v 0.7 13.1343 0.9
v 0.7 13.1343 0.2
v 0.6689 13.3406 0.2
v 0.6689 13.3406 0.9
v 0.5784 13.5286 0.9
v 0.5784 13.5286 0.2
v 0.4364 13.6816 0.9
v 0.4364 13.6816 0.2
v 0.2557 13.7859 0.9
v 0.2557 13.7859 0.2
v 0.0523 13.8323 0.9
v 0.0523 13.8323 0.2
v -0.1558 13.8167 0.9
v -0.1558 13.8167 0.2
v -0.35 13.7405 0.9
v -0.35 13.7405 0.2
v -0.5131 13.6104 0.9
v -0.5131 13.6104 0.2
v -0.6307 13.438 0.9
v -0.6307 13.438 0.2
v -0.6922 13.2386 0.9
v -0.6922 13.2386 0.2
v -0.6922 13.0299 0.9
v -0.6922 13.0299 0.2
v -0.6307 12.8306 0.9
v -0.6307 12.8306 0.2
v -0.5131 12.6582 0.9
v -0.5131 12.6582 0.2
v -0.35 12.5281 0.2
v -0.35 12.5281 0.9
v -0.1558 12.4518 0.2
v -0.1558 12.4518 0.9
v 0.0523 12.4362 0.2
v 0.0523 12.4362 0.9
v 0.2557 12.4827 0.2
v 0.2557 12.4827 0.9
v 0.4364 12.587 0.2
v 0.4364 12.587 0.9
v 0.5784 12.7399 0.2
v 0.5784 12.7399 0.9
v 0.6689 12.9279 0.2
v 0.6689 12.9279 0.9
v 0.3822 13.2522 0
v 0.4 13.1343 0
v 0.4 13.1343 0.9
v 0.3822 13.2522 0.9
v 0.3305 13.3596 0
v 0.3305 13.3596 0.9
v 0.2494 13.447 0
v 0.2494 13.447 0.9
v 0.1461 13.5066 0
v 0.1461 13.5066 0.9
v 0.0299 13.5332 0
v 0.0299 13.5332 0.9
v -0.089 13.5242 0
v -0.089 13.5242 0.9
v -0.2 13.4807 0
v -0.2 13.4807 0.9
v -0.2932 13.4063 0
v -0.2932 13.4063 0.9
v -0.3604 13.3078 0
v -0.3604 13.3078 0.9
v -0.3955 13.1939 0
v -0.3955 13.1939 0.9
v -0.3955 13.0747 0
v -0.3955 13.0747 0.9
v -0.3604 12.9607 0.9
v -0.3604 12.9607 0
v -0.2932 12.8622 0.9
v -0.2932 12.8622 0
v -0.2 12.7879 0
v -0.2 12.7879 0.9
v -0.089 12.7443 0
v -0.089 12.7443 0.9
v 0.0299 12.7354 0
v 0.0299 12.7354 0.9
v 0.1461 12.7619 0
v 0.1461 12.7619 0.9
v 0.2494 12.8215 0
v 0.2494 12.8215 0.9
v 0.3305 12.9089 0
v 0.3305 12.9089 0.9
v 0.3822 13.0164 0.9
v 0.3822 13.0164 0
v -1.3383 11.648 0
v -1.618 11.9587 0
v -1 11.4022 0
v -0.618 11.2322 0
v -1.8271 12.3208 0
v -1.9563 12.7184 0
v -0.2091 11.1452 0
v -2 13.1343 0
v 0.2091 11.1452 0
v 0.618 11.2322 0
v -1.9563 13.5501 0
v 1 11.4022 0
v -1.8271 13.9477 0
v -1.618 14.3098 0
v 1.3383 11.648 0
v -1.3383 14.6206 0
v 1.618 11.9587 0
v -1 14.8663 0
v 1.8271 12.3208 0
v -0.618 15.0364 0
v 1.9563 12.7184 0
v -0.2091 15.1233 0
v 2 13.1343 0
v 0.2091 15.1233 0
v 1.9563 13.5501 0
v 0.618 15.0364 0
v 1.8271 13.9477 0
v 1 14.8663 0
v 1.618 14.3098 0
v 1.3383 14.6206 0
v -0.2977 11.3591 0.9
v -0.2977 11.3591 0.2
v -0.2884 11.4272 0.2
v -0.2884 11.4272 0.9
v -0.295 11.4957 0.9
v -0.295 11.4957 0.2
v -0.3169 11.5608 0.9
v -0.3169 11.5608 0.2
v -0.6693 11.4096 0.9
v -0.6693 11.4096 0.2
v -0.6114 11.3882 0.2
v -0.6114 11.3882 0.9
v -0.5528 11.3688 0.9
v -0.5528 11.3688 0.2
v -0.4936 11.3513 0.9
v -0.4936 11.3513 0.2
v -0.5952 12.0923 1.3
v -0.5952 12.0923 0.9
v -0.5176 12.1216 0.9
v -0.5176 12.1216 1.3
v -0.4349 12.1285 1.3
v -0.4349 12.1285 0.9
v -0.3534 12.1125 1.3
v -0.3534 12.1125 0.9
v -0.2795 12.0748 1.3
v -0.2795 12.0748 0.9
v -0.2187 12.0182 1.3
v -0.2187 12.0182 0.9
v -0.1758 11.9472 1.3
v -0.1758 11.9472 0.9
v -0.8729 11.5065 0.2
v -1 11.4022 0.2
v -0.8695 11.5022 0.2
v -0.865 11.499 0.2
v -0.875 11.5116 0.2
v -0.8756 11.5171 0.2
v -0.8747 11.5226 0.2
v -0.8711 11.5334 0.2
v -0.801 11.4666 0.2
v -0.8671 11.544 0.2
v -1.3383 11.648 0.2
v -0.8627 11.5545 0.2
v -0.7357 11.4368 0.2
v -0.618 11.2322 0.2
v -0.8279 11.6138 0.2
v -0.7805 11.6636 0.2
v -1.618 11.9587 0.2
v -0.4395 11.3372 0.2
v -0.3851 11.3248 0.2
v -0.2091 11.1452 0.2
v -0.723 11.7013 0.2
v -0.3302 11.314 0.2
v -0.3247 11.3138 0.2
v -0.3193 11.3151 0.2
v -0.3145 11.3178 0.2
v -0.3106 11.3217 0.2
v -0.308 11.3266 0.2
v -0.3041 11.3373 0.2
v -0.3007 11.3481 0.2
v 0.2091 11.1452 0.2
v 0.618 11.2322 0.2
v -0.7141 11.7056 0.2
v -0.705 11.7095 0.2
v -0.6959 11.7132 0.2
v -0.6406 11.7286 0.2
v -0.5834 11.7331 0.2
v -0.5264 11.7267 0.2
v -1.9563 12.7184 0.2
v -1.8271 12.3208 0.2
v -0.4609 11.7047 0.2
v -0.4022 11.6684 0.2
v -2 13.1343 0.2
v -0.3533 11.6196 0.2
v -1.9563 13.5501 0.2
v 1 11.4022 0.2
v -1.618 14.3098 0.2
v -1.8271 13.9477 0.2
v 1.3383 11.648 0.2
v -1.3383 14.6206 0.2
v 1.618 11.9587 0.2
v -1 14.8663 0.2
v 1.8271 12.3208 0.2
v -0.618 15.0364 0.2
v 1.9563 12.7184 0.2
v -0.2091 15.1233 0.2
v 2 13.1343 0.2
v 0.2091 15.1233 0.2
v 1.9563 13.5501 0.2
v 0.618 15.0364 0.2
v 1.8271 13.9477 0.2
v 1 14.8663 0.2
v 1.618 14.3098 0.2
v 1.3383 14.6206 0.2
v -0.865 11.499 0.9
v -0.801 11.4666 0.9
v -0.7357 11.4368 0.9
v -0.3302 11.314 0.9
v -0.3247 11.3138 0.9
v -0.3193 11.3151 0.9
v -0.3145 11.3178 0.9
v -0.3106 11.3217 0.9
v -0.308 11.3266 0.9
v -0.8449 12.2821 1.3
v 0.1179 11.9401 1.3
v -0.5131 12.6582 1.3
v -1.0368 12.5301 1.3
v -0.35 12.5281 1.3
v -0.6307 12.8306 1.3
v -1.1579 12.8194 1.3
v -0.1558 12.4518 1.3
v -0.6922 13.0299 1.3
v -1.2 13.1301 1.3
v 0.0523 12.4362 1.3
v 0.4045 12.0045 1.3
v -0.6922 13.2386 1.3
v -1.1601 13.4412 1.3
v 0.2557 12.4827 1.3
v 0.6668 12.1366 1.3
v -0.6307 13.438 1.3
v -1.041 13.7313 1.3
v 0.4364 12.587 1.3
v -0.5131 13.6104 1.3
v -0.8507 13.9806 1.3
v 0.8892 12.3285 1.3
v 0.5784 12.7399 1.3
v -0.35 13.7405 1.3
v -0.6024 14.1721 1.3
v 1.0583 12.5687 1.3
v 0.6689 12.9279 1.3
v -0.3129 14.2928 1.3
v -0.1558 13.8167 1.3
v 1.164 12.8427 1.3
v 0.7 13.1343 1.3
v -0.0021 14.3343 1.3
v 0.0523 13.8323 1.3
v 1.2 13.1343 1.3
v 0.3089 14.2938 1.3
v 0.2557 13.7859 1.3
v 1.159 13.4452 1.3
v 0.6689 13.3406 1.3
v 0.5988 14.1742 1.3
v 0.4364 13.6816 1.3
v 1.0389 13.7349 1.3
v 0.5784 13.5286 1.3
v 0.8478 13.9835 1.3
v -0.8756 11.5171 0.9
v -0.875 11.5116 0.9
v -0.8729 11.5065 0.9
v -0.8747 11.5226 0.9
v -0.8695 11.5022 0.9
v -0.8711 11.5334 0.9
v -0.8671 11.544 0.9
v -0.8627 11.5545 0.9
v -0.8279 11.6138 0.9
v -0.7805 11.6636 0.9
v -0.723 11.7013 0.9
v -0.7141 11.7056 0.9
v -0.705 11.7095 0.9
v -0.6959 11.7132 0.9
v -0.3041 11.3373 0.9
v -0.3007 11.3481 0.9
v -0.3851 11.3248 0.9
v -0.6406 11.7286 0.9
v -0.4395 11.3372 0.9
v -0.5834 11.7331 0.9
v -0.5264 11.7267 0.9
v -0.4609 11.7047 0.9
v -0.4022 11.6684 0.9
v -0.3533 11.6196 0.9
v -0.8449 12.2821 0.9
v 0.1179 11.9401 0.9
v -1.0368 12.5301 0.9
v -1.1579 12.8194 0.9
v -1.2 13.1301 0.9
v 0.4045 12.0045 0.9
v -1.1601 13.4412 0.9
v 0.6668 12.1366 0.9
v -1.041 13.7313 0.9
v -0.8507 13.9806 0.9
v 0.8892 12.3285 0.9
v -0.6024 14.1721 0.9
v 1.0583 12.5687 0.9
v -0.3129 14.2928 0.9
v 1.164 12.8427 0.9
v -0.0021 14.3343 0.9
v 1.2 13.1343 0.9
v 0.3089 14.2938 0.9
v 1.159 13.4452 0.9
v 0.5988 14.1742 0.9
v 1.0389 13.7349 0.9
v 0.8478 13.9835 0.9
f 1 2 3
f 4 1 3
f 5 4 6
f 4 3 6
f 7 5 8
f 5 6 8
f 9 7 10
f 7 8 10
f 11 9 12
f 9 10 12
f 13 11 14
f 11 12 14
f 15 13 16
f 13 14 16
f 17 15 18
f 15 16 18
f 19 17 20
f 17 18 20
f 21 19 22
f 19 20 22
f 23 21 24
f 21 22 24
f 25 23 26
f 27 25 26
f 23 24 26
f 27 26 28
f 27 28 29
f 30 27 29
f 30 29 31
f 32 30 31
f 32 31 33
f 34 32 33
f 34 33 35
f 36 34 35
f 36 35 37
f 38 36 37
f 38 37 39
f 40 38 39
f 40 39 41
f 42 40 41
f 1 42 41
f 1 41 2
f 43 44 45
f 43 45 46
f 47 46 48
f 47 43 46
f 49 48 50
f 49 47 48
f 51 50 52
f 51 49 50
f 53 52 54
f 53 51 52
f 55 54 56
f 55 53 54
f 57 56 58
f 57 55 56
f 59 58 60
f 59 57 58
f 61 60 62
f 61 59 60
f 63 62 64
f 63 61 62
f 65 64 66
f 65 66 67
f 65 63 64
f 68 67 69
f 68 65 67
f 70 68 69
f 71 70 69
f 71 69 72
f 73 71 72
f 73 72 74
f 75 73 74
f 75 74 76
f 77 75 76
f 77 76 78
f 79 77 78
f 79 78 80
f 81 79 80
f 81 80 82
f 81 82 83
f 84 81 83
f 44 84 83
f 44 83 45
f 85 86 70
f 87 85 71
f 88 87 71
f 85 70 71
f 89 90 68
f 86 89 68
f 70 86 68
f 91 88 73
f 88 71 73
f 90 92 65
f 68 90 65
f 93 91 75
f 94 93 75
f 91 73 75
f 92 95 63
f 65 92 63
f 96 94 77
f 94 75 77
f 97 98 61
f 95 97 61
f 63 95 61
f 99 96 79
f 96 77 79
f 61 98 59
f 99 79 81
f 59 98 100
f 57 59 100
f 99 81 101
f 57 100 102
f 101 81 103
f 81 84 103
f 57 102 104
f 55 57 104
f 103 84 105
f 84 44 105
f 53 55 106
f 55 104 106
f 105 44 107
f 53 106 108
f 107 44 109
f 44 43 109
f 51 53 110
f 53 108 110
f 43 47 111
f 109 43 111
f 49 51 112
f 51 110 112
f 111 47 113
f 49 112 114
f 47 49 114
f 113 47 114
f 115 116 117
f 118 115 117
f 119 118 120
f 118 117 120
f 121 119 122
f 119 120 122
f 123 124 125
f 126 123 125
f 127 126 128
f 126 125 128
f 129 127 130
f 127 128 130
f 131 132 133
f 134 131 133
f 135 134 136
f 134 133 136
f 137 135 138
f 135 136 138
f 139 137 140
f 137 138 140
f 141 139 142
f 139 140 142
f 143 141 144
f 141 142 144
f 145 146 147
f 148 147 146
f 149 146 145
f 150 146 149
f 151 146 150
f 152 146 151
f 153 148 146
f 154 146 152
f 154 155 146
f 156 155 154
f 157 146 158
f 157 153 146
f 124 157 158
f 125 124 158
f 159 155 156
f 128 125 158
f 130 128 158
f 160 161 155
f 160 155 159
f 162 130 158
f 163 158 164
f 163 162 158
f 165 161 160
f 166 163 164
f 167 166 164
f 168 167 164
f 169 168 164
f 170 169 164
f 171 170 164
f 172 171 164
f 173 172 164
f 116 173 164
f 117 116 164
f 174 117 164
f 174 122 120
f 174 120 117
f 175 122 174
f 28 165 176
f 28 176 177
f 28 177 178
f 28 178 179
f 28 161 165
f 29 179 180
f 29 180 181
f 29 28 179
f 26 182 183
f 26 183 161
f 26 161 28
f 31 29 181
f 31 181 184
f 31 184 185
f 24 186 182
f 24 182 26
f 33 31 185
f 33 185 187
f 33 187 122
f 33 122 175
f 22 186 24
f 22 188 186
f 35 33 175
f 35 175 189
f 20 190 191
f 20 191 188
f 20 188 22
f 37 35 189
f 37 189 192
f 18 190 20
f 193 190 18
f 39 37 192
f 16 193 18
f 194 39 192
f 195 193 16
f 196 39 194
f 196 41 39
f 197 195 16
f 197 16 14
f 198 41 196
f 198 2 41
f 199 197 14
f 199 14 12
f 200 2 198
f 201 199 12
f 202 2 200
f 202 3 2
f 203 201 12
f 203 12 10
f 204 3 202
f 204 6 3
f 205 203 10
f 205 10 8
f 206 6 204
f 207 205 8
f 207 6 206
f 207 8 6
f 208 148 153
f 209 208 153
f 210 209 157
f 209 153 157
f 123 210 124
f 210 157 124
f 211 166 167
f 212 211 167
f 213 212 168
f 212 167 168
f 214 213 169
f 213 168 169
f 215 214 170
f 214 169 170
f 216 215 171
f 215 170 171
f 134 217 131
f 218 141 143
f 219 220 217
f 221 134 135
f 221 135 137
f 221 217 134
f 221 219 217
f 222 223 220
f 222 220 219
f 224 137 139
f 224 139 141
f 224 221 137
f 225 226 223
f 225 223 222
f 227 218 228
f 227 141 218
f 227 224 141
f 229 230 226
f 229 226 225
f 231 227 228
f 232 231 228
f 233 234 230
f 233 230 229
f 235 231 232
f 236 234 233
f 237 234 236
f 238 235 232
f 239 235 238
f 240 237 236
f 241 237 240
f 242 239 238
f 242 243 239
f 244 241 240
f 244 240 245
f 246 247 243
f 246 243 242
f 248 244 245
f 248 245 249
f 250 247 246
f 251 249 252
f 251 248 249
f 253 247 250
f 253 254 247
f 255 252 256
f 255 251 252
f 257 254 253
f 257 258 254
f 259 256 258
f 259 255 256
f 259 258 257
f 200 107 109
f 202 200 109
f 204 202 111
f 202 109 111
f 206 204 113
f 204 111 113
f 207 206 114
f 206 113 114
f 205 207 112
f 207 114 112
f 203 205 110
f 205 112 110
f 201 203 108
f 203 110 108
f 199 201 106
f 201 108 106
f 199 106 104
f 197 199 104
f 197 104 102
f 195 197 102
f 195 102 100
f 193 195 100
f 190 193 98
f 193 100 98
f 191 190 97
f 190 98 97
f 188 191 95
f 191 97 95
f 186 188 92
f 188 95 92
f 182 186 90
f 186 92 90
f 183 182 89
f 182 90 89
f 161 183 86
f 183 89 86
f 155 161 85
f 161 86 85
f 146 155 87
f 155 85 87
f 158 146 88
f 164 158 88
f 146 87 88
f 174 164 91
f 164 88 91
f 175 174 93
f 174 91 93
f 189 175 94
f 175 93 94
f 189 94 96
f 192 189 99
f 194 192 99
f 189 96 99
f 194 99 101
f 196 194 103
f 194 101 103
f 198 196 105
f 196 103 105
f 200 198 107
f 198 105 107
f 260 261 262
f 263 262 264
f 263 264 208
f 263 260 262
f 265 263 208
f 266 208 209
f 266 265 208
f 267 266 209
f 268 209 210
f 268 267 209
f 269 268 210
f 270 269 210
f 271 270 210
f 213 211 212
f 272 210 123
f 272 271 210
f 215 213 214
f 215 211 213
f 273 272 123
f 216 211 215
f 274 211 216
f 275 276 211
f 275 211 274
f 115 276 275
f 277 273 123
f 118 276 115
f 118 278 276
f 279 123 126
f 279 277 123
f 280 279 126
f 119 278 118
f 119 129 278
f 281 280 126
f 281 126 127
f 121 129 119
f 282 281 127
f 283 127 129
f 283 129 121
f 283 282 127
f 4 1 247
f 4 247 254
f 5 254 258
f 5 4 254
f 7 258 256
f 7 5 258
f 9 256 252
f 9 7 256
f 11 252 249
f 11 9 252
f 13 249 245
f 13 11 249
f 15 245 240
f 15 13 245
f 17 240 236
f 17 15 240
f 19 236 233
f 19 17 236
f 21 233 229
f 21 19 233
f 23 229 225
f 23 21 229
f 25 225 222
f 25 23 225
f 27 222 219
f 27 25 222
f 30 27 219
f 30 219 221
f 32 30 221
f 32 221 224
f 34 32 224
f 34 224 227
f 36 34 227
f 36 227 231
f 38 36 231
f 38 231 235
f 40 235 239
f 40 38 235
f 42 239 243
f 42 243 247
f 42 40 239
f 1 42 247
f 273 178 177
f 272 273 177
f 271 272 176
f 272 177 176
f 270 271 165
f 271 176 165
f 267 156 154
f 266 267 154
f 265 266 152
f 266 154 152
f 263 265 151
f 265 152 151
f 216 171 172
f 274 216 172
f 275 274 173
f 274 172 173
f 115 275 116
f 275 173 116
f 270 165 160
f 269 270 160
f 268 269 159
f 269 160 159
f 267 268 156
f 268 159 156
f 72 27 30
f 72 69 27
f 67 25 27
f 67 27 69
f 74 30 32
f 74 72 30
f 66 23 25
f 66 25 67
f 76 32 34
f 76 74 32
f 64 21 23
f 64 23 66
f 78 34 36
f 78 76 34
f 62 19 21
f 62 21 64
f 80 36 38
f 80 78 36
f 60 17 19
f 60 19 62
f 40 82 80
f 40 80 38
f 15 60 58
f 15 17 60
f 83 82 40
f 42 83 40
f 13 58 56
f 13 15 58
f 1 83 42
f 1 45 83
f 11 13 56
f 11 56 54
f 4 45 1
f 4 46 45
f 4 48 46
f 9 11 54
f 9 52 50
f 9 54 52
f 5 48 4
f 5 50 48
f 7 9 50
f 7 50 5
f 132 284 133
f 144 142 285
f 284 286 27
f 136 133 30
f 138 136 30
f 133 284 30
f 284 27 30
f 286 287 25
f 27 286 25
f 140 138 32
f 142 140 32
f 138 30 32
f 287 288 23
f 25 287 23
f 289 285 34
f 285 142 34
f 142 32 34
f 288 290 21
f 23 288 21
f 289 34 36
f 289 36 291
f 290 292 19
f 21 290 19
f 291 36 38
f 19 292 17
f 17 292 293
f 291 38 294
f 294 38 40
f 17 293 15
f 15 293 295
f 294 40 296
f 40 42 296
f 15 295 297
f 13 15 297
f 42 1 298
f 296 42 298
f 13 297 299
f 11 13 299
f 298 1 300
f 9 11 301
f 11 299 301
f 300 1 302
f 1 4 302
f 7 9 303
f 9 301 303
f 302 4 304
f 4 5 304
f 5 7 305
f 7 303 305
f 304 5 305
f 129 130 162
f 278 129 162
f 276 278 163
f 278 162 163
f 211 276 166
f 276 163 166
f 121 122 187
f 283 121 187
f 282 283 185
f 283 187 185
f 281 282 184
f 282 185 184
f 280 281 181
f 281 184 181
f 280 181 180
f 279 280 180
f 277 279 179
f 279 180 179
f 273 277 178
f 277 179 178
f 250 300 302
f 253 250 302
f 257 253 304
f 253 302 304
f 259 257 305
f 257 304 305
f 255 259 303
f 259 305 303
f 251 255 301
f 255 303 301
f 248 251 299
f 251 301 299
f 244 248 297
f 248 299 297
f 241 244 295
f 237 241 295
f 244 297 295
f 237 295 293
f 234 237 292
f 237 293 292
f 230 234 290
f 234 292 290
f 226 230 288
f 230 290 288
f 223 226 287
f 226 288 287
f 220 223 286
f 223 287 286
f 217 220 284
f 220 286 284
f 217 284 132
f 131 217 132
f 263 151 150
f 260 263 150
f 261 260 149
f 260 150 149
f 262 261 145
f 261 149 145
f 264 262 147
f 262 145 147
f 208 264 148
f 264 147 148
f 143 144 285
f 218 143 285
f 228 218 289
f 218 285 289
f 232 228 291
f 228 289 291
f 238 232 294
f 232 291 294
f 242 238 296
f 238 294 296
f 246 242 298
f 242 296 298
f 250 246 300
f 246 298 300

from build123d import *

# Parameters (mm, degrees)
SKETCH1_R           = 2
SKETCH1_R_2         = 0.4
BOSS_EXTRUDE1_DEPTH = 0.2
SKETCH1_9_R         = 0.7
SKETCH1_9_R_2       = 0.4
BOSS_EXTRUDE2_DEPTH = 0.9
BOSS_EXTRUDE3_START = 0.9
SKETCH1_10_R        = 0.7
BOSS_EXTRUDE3_DEPTH = 0.4
BOSS_EXTRUDE4_DEPTH = 0.9


with BuildPart() as part:
    # Sketch1 → Boss-Extrude1 (new body)
    with BuildSketch(Plane.XY):
        with Locations((0, 13.134272207)):
            Circle(SKETCH1_R)
        with Locations((0, 13.134272207)):
            Circle(SKETCH1_R_2, mode=Mode.SUBTRACT)
    extrude(amount=BOSS_EXTRUDE1_DEPTH)

    # Sketch1<9> → Boss-Extrude2 (add)
    with BuildSketch(Plane.XY):
        with Locations((0, 13.134272207)):
            Circle(SKETCH1_9_R)
        with Locations((0, 13.134272207)):
            Circle(SKETCH1_9_R_2, mode=Mode.SUBTRACT)
    extrude(amount=BOSS_EXTRUDE2_DEPTH)

    # Sketch1<11> → Boss-Extrude4 (add)
    with BuildSketch(Plane.XY):
        with BuildLine():
            ThreePointArc((-0.722952446, 11.701281818), (-0.80562228, 11.640057681), (-0.862748393, 11.554504753))
            ThreePointArc((-0.862748393, 11.554504753), (-0.769774263, 11.507174305), (-0.674214176, 11.465309882))
            Line((-0.674214176, 11.465309882), (-0.690125144, 11.647173071))
            ThreePointArc((-0.690125144, 11.647173071), (-0.707969637, 11.673359365), (-0.722952446, 11.701281818))
        make_face()
        with BuildLine():
            Line((-0.695904051, 11.713226287), (-0.690125144, 11.647173071))
            ThreePointArc((-0.690125144, 11.647173071), (-0.61018442, 11.574383117), (-0.509631962, 11.53465781))
            Line((-0.509631962, 11.53465781), (-0.526432402, 11.726687722))
            ThreePointArc((-0.526432402, 11.726687722), (-0.612141723, 11.732212758), (-0.695904051, 11.713226287))
        make_face()
        with BuildLine():
            Line((-0.690125144, 11.647173071), (-0.674214176, 11.465309882))
            ThreePointArc((-0.674214176, 11.465309882), (-0.587019252, 11.432682246), (-0.498253958, 11.404606635))
            Line((-0.498253958, 11.404606635), (-0.509631962, 11.53465781))
            ThreePointArc((-0.509631962, 11.53465781), (-0.61018442, 11.574383117), (-0.690125144, 11.647173071))
        make_face()
        with BuildLine():
            ThreePointArc((-0.498253958, 11.404606635), (-0.398618868, 11.378965112), (-0.297681545, 11.359057939))
            ThreePointArc((-0.297681545, 11.359057939), (-0.289740827, 11.461623242), (-0.316916575, 11.560841058))
            ThreePointArc((-0.316916575, 11.560841058), (-0.411093619, 11.531699297), (-0.509631962, 11.53465781))
            Line((-0.509631962, 11.53465781), (-0.498253958, 11.404606635))
        make_face()
        with BuildLine():
            ThreePointArc((-0.509631962, 11.53465781), (-0.411093619, 11.531699297), (-0.316916575, 11.560841058))
            ThreePointArc((-0.316916575, 11.560841058), (-0.402189954, 11.668379407), (-0.526432402, 11.726687722))
            Line((-0.526432402, 11.726687722), (-0.509631962, 11.53465781))
        make_face()
        with BuildLine():
            ThreePointArc((-0.865004944, 11.498953753), (-0.76847241, 11.451432299), (-0.66934047, 11.409603156))
            Line((-0.66934047, 11.409603156), (-0.674214176, 11.465309882))
            ThreePointArc((-0.674214176, 11.465309882), (-0.769774263, 11.507174305), (-0.862748393, 11.554504753))
            ThreePointArc((-0.862748393, 11.554504753), (-0.869199801, 11.538720697), (-0.874744005, 11.522595597))
            ThreePointArc((-0.874744005, 11.522595597), (-0.874145949, 11.509015077), (-0.865004944, 11.498953753))
        make_face()
        with BuildLine():
            Line((-0.674214176, 11.465309882), (-0.66934047, 11.409603156))
            ThreePointArc((-0.66934047, 11.409603156), (-0.582196295, 11.37826894), (-0.49359328, 11.351334835))
            Line((-0.49359328, 11.351334835), (-0.498253958, 11.404606635))
            ThreePointArc((-0.498253958, 11.404606635), (-0.587019252, 11.432682246), (-0.674214176, 11.465309882))
        make_face()
        with BuildLine():
            ThreePointArc((-0.307964475, 11.326556396), (-0.302360987, 11.342660992), (-0.297681545, 11.359057939))
            ThreePointArc((-0.297681545, 11.359057939), (-0.398618868, 11.378965112), (-0.498253958, 11.404606635))
            Line((-0.498253958, 11.404606635), (-0.49359328, 11.351334835))
            ThreePointArc((-0.49359328, 11.351334835), (-0.412334455, 11.33080879), (-0.330229358, 11.313984161))
            ThreePointArc((-0.330229358, 11.313984161), (-0.316825436, 11.316247586), (-0.307964475, 11.326556396))
        make_face()
        with BuildLine():
            ThreePointArc((-0.695904051, 11.713226287), (-0.709575496, 11.707587495), (-0.722952446, 11.701281818))
            ThreePointArc((-0.722952446, 11.701281818), (-0.707969637, 11.673359365), (-0.690125144, 11.647173071))
            Line((-0.690125144, 11.647173071), (-0.695904051, 11.713226287))
        make_face()
    extrude(amount=BOSS_EXTRUDE4_DEPTH)


with BuildPart() as body_2:
    # Sketch1<10> → Boss-Extrude3 (new body)
    with BuildSketch(Plane.XY.offset(BOSS_EXTRUDE3_START)):
        with BuildLine():
            ThreePointArc((1.2, 13.134272207), (-0.602387358, 14.172120689), (-0.595215785, 12.092294199))
            ThreePointArc((-0.595215785, 12.092294199), (-0.353417508, 12.112487744), (-0.175768873, 11.947214794))
            ThreePointArc((-0.175768873, 11.947214794), (0.783925173, 12.225723186), (1.2, 13.134272207))
        make_face()
        with Locations((0, 13.134272207)):
            Circle(SKETCH1_10_R, mode=Mode.SUBTRACT)
    extrude(amount=BOSS_EXTRUDE3_DEPTH)


solid = Compound([part.part, body_2.part])
